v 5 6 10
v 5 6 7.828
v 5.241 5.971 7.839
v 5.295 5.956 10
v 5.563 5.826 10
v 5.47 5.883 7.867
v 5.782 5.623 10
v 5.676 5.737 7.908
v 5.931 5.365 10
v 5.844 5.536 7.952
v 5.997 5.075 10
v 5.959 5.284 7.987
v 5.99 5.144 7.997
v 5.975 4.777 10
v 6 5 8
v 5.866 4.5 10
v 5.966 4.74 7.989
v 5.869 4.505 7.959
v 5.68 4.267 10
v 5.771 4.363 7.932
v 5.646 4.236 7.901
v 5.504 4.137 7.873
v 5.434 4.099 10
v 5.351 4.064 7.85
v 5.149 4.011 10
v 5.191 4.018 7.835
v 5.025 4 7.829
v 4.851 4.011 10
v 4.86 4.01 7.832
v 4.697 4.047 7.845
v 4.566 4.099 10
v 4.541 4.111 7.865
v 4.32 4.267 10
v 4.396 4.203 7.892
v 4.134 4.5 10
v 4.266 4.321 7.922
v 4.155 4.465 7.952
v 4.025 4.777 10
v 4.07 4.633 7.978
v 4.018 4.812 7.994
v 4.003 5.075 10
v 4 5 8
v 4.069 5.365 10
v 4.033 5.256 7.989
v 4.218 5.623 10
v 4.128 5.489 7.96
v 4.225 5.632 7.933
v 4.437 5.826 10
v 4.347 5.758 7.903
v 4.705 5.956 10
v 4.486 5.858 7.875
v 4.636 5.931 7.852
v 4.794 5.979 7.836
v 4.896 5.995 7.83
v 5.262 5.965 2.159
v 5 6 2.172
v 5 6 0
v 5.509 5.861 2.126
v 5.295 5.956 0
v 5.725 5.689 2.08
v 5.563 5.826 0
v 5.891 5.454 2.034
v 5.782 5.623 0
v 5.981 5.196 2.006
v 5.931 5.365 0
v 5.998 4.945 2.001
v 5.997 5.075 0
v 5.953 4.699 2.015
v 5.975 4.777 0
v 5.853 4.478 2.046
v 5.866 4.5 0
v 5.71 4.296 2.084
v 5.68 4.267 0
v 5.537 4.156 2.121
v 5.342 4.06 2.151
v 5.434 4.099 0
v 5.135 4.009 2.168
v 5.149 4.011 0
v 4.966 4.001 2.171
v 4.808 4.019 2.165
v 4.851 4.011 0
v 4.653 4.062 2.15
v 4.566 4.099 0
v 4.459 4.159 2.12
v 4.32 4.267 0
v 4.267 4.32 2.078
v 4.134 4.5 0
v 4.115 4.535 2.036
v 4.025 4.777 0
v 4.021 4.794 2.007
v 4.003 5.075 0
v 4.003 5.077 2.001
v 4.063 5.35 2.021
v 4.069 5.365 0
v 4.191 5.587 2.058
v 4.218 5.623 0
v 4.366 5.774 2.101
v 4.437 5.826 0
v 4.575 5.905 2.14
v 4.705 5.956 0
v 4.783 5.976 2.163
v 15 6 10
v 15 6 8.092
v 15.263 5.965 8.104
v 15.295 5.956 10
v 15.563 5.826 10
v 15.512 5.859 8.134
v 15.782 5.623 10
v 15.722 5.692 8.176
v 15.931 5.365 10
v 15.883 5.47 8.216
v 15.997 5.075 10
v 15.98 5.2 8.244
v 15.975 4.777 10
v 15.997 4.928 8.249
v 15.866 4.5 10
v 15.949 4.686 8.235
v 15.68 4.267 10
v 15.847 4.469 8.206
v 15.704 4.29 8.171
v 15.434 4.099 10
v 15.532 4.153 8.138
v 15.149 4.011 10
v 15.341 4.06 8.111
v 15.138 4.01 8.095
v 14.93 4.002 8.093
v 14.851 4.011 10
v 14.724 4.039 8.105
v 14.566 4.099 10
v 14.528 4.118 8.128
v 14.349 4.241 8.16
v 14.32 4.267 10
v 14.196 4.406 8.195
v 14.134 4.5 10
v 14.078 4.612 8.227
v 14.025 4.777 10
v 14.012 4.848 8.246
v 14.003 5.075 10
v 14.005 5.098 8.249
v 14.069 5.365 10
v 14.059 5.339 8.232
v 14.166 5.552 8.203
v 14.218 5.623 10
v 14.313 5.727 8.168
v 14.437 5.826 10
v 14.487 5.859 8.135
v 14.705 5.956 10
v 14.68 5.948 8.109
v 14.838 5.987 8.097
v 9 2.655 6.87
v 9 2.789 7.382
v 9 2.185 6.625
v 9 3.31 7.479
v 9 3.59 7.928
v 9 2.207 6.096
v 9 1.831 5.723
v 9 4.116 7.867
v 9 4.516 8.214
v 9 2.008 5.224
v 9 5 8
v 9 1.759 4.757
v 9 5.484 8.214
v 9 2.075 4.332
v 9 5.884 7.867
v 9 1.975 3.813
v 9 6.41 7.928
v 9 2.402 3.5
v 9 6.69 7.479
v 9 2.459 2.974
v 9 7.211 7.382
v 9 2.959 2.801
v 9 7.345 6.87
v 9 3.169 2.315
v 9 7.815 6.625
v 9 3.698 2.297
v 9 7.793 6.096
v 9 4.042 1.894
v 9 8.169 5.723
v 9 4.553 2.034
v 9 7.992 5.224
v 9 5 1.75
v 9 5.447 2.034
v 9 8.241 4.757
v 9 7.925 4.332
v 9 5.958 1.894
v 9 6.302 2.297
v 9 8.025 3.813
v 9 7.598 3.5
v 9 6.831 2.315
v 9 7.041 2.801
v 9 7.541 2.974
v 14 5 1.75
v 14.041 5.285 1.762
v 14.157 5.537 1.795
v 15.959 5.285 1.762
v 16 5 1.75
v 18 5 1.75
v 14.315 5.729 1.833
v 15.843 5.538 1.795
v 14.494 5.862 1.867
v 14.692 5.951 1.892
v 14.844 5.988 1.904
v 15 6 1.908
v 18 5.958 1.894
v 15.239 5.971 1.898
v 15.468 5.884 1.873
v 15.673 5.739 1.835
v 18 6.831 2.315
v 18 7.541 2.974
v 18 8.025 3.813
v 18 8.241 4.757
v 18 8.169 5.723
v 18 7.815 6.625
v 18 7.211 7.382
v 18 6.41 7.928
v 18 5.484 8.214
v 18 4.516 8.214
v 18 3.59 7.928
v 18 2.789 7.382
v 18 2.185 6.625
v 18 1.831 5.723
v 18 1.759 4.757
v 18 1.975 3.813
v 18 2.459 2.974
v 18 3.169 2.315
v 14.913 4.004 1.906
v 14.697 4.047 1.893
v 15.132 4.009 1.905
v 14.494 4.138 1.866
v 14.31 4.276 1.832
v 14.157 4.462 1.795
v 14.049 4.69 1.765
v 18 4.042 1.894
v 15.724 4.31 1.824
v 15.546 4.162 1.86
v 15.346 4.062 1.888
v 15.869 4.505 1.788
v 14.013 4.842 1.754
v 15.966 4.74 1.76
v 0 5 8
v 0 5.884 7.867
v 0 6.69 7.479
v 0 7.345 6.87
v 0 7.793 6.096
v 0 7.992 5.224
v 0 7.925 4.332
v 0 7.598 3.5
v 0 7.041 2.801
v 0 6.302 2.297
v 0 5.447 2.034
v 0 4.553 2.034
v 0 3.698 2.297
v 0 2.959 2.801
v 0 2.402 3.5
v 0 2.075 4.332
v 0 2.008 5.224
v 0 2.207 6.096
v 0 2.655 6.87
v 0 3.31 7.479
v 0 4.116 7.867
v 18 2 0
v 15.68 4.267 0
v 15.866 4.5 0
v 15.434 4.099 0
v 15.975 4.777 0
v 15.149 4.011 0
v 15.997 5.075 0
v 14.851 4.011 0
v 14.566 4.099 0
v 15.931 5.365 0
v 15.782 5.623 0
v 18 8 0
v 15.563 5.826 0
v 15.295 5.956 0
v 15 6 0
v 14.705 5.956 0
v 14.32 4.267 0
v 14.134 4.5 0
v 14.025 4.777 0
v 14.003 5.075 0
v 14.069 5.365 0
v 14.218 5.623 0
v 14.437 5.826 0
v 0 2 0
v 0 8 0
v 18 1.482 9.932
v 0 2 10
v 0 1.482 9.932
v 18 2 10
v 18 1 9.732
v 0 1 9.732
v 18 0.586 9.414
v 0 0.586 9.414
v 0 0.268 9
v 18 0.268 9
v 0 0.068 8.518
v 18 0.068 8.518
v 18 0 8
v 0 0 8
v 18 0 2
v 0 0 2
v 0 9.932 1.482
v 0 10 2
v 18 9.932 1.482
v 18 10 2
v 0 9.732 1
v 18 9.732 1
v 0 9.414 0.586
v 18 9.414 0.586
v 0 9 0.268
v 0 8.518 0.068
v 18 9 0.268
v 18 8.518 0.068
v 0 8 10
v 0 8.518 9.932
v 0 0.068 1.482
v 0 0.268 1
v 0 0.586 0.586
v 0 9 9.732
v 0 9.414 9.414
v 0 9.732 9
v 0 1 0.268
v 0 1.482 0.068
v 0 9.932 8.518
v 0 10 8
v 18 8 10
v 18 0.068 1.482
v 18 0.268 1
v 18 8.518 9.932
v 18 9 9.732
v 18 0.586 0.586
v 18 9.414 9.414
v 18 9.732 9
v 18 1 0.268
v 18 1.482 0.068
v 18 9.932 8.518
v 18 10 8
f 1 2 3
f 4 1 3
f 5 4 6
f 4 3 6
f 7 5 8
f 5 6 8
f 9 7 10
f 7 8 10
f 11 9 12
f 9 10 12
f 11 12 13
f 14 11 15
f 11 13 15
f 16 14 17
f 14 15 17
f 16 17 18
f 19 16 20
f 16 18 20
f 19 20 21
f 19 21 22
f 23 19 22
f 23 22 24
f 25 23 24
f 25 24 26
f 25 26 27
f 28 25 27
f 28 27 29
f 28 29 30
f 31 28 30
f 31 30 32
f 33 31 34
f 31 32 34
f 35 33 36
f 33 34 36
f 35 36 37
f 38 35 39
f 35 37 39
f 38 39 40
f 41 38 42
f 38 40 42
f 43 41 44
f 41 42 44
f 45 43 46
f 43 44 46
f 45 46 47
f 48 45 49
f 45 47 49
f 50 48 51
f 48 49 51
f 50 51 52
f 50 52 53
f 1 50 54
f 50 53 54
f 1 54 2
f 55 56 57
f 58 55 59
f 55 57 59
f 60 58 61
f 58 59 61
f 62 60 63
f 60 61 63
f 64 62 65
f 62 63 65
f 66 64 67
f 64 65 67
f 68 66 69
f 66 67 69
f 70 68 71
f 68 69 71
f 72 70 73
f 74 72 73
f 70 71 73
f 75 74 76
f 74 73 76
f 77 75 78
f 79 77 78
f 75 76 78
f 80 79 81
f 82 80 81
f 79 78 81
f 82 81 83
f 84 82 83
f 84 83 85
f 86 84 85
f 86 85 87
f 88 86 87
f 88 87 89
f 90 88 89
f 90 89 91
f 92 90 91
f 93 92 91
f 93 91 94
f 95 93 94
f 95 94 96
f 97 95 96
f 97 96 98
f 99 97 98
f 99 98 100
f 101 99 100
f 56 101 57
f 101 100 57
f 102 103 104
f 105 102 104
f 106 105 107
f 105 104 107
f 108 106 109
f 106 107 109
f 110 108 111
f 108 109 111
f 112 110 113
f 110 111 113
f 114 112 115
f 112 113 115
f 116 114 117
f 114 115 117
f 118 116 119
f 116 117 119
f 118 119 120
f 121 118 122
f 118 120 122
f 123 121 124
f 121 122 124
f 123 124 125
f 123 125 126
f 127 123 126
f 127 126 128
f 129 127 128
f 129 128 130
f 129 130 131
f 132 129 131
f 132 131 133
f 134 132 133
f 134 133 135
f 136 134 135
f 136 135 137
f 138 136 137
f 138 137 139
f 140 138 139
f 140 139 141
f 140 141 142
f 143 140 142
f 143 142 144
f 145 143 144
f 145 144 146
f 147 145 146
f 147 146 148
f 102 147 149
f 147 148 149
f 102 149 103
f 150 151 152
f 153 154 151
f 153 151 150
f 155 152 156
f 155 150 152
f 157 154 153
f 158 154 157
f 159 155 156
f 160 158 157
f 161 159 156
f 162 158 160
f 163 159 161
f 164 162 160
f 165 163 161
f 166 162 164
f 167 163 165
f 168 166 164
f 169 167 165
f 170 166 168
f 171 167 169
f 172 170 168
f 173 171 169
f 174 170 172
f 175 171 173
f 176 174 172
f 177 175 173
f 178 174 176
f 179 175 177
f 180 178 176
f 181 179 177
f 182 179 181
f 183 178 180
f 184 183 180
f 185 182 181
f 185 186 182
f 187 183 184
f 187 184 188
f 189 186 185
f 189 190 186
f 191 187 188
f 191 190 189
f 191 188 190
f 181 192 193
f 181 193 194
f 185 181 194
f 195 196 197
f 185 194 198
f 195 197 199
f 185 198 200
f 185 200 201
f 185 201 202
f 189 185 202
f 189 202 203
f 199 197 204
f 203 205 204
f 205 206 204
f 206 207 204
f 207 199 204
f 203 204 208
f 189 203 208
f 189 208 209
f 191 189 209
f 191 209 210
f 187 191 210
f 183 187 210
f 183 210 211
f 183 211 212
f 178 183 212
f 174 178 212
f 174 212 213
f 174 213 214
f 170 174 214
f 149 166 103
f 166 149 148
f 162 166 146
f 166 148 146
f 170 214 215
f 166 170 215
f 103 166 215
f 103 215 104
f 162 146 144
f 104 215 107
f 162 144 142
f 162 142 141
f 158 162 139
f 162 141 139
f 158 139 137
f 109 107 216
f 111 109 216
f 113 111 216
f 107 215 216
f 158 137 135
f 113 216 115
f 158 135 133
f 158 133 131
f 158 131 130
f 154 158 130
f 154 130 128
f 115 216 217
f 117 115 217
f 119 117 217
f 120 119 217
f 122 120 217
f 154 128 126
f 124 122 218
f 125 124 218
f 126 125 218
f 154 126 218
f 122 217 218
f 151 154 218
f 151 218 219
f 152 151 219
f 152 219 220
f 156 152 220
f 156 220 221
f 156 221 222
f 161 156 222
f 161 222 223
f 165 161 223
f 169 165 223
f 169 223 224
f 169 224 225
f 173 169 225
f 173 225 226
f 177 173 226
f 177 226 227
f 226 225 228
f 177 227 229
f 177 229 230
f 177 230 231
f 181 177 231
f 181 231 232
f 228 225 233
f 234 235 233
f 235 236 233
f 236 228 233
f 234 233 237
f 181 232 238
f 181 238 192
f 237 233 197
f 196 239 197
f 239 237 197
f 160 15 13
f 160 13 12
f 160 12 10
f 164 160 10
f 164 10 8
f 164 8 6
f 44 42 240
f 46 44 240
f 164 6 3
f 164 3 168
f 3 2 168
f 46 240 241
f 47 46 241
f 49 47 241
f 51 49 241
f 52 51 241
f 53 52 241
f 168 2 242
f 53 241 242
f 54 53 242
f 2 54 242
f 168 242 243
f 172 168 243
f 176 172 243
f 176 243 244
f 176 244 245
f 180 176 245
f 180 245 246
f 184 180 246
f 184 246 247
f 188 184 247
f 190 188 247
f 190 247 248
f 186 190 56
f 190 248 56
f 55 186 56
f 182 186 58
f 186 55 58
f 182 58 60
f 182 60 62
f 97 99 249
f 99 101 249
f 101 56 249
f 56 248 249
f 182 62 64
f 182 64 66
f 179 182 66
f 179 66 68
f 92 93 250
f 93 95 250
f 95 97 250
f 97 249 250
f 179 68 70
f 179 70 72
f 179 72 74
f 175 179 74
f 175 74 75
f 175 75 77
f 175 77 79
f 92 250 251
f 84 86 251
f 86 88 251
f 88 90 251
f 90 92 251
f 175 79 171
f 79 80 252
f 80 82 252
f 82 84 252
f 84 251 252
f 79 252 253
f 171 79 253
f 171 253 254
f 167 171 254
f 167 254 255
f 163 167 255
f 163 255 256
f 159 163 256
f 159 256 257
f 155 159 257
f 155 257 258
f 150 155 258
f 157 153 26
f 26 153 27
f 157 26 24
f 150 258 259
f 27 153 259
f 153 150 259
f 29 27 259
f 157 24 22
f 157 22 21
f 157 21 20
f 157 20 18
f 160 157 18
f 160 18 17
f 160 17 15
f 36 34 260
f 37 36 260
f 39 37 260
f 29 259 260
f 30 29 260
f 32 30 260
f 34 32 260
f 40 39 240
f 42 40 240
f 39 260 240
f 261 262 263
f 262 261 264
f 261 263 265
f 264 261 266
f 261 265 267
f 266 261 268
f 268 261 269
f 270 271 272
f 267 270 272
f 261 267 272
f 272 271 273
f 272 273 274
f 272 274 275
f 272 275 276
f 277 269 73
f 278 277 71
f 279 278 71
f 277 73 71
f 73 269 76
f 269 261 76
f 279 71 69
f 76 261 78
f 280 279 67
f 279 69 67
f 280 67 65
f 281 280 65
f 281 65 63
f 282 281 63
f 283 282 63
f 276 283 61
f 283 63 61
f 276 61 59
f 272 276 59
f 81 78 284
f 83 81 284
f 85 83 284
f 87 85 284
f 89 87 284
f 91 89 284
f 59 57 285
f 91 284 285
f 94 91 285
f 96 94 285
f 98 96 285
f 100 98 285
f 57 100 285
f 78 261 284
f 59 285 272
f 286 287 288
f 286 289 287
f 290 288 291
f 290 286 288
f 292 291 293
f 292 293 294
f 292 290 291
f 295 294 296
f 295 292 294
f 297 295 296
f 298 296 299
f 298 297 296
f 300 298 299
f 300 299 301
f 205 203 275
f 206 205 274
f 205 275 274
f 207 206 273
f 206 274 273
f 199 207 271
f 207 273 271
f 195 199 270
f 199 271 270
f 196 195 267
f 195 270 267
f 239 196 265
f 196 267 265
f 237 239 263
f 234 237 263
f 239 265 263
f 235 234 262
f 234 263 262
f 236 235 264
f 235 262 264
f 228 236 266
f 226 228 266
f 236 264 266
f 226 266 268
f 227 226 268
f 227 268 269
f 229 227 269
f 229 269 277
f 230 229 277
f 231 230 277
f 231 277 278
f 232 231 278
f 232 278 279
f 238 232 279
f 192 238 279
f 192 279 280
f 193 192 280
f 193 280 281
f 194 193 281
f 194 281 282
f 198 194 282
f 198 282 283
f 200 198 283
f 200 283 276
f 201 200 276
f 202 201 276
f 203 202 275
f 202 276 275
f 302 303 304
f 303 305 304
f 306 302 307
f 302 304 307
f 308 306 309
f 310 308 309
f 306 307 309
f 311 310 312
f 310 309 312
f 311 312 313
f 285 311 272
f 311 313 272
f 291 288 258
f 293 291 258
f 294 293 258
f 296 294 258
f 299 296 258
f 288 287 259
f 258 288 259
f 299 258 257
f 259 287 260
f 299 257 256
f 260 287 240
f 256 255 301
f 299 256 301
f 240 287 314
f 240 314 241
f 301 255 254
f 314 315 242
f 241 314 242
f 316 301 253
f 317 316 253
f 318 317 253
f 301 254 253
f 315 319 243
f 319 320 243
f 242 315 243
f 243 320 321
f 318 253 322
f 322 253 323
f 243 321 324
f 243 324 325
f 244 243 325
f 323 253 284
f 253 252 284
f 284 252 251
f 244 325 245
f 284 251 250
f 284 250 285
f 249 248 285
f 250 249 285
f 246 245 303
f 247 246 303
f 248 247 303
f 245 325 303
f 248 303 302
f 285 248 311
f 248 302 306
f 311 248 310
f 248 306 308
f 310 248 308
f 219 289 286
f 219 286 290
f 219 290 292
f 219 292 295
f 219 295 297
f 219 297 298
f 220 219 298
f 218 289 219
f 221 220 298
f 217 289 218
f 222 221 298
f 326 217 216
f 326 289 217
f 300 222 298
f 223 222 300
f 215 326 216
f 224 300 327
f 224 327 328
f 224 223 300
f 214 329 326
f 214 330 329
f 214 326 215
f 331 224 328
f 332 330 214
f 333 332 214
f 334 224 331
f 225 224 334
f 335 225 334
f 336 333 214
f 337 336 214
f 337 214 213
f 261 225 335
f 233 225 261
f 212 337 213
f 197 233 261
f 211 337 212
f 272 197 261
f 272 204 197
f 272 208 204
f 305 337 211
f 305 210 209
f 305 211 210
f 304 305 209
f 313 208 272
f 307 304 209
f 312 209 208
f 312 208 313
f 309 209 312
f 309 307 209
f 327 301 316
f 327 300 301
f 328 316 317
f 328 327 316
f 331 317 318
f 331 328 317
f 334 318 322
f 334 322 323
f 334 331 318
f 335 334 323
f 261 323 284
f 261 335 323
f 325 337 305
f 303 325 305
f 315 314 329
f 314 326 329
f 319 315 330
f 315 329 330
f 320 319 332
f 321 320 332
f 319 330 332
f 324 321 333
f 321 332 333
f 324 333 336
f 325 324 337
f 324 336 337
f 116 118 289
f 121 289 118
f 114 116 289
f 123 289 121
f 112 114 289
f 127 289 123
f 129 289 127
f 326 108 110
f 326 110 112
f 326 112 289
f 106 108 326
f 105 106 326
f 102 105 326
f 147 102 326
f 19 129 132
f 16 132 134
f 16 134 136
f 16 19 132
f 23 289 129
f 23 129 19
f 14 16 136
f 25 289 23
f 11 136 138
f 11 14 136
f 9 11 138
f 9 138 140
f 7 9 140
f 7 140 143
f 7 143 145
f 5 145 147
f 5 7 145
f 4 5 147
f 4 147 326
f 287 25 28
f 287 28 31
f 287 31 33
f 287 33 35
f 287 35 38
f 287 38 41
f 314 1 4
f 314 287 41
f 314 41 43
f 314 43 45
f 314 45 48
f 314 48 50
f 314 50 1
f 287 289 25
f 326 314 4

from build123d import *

# Parameters (mm, degrees)
SKETCH_1_W          = 10
SKETCH_1_H          = 10
EXTRUDE_2_DEPTH     = 18
SKETCH_2_R          = 3.25
CUT_EXTRUDE_1_DEPTH = 9
SKETCH_3_R          = 3
CUT_EXTRUDE_2_DEPTH = 15
SKETCH_4_R          = 1
CUT_EXTRUDE_3_DEPTH = 10
FILLET_1_R          = 2


with BuildPart() as part:
    # 草图1 → 凸台-拉伸2 (new body)
    with BuildSketch(Plane(origin=(0, 0, 0), x_dir=(0, 0, -1), z_dir=(1, 0, 0))):
        with Locations((-5, 5)):
            Rectangle(SKETCH_1_W, SKETCH_1_H)
    extrude(amount=EXTRUDE_2_DEPTH)

    # 草图2 → 切除-拉伸1 (cut)
    with BuildSketch(Plane(origin=(18, 0, 0), x_dir=(0, 0, -1), z_dir=(1, 0, 0))):
        with Locations((-5, 5)):
            Circle(SKETCH_2_R)
    extrude(amount=-CUT_EXTRUDE_1_DEPTH, mode=Mode.SUBTRACT)

    # 草图3 → 切除-拉伸2 (cut)
    with BuildSketch(Plane.ZY):
        with Locations((5, 5)):
            Circle(SKETCH_3_R)
    extrude(amount=-CUT_EXTRUDE_2_DEPTH, mode=Mode.SUBTRACT)

    # 草图4 → 切除-拉伸3 (cut)
    with BuildSketch(Plane(origin=(0, 0, 0), x_dir=(-1, 0, 0), z_dir=(0, 0, -1))):
        with Locations(Location((-15, 5, 0), (0, 0, 90))):
            Circle(SKETCH_4_R)
        with Locations(Location((-5, 5, 0), (0, 0, 90))):
            Circle(SKETCH_4_R)
    extrude(amount=-CUT_EXTRUDE_3_DEPTH, mode=Mode.SUBTRACT)

    # 圆角1
    fillet_1_edges = [part.edges().sort_by_distance(p)[0] for p in [
        (9, 0, 0),
        (9, 10, 0),
        (9, 10, 10),
        (9, 0, 10),
    ]]
    fillet(fillet_1_edges, radius=FILLET_1_R)


solid = part.part
